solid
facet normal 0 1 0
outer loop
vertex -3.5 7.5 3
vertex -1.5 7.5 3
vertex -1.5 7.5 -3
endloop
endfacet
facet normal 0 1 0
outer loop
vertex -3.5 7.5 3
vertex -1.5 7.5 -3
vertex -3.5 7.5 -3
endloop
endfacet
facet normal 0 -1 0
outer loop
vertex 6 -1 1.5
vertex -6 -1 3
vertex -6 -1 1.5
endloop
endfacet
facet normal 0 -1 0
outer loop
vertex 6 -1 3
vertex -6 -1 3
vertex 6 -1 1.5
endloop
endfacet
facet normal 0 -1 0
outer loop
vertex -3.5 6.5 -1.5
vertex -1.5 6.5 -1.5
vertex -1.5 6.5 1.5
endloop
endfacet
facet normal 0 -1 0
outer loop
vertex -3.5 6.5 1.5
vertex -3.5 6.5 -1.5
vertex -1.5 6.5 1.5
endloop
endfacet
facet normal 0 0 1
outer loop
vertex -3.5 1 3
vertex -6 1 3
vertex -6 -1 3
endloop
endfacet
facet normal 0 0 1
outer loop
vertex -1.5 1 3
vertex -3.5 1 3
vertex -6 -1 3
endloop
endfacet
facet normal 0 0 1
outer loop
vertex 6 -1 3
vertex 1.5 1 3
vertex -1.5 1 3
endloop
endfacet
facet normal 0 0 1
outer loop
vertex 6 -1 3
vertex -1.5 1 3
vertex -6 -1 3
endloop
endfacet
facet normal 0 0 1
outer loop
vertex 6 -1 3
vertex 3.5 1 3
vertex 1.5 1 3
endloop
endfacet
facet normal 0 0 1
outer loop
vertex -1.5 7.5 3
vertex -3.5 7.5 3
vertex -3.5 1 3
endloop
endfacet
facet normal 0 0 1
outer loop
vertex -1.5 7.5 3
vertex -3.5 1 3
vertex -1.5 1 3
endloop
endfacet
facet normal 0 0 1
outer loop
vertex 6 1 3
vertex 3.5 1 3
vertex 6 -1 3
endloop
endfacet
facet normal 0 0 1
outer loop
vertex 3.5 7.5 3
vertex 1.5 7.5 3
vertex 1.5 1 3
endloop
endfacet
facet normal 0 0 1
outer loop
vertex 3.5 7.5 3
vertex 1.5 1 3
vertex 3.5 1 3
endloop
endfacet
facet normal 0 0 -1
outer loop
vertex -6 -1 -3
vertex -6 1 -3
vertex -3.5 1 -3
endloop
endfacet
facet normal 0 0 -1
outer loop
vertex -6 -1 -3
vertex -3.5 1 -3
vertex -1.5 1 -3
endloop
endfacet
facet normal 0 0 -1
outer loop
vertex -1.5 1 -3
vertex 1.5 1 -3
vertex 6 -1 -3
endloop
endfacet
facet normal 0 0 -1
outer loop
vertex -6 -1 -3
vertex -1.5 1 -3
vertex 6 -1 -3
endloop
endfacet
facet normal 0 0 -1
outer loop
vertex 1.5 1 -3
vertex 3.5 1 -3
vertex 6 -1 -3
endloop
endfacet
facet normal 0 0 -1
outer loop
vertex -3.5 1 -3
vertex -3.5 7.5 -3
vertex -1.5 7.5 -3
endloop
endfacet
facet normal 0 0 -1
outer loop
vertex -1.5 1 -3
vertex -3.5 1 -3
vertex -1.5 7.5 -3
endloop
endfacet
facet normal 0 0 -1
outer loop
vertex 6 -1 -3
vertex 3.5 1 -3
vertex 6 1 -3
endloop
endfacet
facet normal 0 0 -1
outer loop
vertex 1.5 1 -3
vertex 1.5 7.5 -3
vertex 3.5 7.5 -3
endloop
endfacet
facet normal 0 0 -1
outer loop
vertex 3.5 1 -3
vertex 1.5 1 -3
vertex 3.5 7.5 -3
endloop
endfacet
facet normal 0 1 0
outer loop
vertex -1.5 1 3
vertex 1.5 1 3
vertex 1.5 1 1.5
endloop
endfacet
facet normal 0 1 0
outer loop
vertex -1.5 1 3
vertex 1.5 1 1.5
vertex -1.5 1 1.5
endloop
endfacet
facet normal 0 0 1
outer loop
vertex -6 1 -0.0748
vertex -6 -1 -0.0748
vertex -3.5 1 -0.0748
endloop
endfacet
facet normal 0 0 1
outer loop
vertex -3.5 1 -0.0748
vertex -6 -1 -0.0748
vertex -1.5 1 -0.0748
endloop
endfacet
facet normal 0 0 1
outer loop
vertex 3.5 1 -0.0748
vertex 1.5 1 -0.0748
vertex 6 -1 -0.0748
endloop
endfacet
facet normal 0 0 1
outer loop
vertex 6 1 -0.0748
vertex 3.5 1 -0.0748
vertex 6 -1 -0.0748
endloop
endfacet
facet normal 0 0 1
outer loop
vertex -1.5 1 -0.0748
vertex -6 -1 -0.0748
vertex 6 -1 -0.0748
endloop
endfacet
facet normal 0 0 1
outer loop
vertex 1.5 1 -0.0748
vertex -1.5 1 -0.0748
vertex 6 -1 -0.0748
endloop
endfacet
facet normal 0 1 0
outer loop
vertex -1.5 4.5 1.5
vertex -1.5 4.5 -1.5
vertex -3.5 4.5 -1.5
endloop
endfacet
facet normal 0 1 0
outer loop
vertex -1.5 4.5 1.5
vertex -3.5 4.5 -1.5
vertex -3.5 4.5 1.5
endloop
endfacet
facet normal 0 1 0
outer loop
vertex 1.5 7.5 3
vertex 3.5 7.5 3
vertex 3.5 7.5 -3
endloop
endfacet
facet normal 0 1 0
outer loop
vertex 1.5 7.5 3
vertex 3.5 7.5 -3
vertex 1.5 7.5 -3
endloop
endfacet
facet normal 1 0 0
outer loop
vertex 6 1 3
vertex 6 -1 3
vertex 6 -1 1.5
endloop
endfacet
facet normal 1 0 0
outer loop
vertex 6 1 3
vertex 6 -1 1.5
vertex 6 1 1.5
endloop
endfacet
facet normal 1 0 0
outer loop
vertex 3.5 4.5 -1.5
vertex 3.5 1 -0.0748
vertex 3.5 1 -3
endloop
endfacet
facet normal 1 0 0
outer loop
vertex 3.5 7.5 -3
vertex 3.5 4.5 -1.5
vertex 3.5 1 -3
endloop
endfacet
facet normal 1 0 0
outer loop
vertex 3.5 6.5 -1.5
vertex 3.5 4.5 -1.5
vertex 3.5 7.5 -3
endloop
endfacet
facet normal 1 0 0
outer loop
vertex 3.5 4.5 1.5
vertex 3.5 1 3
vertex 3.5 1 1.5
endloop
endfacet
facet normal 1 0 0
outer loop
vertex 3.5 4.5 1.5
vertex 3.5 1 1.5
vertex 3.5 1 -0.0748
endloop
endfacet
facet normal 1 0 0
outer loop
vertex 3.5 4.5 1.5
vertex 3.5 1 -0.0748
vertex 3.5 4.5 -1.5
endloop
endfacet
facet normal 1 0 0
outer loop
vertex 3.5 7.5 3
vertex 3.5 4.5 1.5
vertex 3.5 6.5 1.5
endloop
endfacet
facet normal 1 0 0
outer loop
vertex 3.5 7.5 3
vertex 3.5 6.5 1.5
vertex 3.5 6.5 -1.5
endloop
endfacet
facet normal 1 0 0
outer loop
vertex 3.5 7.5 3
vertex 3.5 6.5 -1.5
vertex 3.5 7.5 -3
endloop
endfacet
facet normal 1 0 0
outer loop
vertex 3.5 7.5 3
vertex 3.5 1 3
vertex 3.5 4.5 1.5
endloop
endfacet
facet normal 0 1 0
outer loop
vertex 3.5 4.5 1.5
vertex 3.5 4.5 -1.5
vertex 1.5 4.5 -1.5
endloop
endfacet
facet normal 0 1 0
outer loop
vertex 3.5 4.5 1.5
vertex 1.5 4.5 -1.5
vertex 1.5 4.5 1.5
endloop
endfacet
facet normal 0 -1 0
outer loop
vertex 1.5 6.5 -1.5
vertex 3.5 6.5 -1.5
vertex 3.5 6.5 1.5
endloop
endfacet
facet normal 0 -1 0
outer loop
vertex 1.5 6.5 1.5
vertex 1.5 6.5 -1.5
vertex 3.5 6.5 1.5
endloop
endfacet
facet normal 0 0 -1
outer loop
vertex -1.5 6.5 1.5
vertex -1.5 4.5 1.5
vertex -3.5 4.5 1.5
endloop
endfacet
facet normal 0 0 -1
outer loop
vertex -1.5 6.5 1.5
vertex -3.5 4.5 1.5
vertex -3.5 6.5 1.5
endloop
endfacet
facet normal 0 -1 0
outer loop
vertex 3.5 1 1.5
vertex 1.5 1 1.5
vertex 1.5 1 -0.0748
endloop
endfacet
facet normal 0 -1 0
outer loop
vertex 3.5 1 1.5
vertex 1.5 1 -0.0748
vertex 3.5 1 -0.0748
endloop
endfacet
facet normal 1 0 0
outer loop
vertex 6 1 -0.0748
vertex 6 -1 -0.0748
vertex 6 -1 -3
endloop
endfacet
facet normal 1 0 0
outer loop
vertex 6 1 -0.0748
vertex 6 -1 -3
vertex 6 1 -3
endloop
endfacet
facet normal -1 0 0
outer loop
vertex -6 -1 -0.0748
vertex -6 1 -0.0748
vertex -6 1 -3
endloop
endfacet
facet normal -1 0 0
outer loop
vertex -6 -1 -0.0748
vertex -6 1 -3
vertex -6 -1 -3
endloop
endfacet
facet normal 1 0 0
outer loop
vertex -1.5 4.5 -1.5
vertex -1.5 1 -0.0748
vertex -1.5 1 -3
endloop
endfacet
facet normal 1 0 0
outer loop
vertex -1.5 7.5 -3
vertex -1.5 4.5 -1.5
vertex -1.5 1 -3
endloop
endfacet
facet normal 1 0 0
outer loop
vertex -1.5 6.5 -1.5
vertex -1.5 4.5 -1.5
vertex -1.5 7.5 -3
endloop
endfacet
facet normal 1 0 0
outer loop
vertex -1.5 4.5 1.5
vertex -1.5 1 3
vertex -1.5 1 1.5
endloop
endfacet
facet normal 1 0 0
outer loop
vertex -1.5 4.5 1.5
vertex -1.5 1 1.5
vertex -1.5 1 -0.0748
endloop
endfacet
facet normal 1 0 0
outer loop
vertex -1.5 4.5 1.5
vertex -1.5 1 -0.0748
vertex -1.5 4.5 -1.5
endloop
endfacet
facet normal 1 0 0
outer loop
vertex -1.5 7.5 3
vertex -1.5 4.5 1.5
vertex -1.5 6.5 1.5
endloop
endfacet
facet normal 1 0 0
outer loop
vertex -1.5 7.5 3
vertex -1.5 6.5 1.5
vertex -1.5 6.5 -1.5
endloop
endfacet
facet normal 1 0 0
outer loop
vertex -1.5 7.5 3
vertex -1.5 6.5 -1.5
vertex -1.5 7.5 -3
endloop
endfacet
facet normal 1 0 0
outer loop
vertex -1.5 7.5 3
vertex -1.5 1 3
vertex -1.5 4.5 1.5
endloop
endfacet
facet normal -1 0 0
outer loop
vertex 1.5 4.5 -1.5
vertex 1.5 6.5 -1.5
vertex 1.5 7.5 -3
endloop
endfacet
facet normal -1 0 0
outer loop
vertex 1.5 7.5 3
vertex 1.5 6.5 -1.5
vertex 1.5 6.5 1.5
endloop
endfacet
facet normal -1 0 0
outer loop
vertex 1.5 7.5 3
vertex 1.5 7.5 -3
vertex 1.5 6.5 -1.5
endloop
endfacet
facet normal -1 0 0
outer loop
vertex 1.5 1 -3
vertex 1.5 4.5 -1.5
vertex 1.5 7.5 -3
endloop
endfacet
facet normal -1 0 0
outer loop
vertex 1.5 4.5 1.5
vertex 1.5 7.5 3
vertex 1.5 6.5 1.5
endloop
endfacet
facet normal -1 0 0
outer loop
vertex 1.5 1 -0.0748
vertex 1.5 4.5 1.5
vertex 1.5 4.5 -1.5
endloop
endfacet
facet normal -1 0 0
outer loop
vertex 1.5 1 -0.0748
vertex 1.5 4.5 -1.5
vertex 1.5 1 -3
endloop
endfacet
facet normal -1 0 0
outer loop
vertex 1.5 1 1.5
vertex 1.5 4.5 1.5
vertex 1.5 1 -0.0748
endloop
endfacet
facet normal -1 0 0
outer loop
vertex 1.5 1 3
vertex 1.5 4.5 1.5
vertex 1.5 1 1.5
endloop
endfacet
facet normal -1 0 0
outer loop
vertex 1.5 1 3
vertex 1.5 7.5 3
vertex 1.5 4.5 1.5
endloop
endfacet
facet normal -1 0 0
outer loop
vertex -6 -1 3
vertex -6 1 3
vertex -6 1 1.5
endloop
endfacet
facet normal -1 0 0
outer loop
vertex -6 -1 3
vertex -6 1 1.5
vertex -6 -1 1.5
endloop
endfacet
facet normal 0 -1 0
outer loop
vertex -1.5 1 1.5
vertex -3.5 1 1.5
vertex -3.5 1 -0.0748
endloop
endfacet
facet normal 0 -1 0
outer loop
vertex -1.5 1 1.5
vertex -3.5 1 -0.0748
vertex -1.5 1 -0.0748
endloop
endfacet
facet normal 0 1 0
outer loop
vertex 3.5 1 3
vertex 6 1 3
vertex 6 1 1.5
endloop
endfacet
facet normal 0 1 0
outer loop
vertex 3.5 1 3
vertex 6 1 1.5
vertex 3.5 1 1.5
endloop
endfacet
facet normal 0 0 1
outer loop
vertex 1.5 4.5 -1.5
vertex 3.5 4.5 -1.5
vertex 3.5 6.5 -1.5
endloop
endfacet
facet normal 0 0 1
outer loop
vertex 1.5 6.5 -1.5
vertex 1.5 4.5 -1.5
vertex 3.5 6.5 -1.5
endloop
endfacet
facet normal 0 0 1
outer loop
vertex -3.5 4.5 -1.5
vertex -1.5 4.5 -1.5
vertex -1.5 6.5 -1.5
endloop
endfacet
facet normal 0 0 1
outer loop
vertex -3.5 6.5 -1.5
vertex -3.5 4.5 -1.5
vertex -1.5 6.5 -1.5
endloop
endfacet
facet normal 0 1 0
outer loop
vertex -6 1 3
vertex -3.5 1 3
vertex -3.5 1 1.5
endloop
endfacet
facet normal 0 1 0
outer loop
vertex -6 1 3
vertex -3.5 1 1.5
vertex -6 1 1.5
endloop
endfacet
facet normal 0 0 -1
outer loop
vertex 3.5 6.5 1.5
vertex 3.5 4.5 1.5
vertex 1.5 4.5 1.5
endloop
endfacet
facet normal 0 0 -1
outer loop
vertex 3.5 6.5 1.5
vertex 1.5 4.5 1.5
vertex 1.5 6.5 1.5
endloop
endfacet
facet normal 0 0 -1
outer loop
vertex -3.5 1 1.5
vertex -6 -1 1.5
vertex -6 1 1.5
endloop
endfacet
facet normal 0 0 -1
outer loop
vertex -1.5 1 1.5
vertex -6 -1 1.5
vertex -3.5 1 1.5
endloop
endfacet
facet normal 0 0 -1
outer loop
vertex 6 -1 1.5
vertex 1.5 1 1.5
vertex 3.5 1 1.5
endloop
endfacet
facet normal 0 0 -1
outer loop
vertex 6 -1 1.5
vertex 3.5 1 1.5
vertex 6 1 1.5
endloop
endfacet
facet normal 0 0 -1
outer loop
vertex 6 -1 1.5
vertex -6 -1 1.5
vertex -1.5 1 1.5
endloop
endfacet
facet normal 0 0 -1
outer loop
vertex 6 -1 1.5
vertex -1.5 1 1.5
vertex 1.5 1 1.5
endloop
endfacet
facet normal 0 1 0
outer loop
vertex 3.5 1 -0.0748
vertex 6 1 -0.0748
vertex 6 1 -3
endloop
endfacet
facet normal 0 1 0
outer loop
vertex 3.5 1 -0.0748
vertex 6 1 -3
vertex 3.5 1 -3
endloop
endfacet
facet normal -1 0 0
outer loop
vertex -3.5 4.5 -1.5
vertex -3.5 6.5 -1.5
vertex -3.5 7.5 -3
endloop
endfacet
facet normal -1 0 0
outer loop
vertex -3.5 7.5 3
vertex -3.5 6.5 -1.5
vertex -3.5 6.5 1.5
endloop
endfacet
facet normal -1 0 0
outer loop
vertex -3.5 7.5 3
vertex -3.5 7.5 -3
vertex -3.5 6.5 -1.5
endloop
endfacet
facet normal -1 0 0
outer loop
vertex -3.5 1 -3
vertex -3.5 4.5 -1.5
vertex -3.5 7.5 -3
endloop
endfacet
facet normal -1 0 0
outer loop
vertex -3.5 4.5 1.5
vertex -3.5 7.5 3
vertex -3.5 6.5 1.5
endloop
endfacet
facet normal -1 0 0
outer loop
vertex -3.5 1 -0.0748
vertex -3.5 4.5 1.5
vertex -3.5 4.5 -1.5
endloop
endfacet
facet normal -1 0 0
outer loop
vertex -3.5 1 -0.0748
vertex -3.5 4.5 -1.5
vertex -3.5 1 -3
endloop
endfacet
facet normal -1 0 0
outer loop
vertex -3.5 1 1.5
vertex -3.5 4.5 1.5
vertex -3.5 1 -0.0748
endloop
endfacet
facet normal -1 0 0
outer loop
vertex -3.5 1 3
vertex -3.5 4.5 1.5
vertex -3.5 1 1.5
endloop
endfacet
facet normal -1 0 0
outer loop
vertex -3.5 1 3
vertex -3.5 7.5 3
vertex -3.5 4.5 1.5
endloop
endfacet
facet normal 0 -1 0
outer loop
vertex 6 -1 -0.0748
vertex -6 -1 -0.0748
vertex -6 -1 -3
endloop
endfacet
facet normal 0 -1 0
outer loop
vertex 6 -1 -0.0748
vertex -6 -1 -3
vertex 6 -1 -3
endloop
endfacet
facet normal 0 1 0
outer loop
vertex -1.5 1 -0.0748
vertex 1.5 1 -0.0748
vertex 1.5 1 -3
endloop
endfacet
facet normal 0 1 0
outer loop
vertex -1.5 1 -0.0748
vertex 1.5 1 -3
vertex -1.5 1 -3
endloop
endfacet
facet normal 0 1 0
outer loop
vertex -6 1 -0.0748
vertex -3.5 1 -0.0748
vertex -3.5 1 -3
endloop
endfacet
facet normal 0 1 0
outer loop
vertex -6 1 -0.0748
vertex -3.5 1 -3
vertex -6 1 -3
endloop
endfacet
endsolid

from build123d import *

# Parameters (mm, degrees)
BOSS_EXTRUDE1_DEPTH     = 3
SKETCH4_W               = 12
SKETCH4_H               = 1.5748
CUT_EXTRUDE3_DEPTH      = 2
CUT_EXTRUDE4_DEPTH      = 13.469963913
CUT_EXTRUDE4_DEPTH_BACK = 13.469963913
SKETCH5_W               = 3
SKETCH5_H               = 2


with BuildPart() as part:
    # Sketch1 → Boss-Extrude1 (new, symmetric)
    with BuildSketch(Plane.XY):
        Polygon((-6, -1), (6, -1), (6, 1), (3.5, 1), (3.5, 7.5), (1.5, 7.5), (1.5, 1), (-1.5, 1), (-1.5, 7.5), (-3.5, 7.5), (-3.5, 1), (-6, 1), align=None)
    extrude(amount=BOSS_EXTRUDE1_DEPTH, both=True)

    # Sketch4 → Cut-Extrude3 (cut)
    with BuildSketch(Plane.XZ.offset(1)):
        with Locations((0, 0.7126)):
            Rectangle(SKETCH4_W, SKETCH4_H)
    extrude(amount=-CUT_EXTRUDE3_DEPTH, mode=Mode.SUBTRACT)

    # Sketch5 → Cut-Extrude4 (cut, two sides: drawn at the far end of the back side and taken through both)
    with BuildSketch(Plane.ZY.offset(3.5).offset(-CUT_EXTRUDE4_DEPTH_BACK)):
        with Locations((0, 5.5)):
            Rectangle(SKETCH5_W, SKETCH5_H)
    extrude(amount=CUT_EXTRUDE4_DEPTH + CUT_EXTRUDE4_DEPTH_BACK, mode=Mode.SUBTRACT)


solid = part.part
